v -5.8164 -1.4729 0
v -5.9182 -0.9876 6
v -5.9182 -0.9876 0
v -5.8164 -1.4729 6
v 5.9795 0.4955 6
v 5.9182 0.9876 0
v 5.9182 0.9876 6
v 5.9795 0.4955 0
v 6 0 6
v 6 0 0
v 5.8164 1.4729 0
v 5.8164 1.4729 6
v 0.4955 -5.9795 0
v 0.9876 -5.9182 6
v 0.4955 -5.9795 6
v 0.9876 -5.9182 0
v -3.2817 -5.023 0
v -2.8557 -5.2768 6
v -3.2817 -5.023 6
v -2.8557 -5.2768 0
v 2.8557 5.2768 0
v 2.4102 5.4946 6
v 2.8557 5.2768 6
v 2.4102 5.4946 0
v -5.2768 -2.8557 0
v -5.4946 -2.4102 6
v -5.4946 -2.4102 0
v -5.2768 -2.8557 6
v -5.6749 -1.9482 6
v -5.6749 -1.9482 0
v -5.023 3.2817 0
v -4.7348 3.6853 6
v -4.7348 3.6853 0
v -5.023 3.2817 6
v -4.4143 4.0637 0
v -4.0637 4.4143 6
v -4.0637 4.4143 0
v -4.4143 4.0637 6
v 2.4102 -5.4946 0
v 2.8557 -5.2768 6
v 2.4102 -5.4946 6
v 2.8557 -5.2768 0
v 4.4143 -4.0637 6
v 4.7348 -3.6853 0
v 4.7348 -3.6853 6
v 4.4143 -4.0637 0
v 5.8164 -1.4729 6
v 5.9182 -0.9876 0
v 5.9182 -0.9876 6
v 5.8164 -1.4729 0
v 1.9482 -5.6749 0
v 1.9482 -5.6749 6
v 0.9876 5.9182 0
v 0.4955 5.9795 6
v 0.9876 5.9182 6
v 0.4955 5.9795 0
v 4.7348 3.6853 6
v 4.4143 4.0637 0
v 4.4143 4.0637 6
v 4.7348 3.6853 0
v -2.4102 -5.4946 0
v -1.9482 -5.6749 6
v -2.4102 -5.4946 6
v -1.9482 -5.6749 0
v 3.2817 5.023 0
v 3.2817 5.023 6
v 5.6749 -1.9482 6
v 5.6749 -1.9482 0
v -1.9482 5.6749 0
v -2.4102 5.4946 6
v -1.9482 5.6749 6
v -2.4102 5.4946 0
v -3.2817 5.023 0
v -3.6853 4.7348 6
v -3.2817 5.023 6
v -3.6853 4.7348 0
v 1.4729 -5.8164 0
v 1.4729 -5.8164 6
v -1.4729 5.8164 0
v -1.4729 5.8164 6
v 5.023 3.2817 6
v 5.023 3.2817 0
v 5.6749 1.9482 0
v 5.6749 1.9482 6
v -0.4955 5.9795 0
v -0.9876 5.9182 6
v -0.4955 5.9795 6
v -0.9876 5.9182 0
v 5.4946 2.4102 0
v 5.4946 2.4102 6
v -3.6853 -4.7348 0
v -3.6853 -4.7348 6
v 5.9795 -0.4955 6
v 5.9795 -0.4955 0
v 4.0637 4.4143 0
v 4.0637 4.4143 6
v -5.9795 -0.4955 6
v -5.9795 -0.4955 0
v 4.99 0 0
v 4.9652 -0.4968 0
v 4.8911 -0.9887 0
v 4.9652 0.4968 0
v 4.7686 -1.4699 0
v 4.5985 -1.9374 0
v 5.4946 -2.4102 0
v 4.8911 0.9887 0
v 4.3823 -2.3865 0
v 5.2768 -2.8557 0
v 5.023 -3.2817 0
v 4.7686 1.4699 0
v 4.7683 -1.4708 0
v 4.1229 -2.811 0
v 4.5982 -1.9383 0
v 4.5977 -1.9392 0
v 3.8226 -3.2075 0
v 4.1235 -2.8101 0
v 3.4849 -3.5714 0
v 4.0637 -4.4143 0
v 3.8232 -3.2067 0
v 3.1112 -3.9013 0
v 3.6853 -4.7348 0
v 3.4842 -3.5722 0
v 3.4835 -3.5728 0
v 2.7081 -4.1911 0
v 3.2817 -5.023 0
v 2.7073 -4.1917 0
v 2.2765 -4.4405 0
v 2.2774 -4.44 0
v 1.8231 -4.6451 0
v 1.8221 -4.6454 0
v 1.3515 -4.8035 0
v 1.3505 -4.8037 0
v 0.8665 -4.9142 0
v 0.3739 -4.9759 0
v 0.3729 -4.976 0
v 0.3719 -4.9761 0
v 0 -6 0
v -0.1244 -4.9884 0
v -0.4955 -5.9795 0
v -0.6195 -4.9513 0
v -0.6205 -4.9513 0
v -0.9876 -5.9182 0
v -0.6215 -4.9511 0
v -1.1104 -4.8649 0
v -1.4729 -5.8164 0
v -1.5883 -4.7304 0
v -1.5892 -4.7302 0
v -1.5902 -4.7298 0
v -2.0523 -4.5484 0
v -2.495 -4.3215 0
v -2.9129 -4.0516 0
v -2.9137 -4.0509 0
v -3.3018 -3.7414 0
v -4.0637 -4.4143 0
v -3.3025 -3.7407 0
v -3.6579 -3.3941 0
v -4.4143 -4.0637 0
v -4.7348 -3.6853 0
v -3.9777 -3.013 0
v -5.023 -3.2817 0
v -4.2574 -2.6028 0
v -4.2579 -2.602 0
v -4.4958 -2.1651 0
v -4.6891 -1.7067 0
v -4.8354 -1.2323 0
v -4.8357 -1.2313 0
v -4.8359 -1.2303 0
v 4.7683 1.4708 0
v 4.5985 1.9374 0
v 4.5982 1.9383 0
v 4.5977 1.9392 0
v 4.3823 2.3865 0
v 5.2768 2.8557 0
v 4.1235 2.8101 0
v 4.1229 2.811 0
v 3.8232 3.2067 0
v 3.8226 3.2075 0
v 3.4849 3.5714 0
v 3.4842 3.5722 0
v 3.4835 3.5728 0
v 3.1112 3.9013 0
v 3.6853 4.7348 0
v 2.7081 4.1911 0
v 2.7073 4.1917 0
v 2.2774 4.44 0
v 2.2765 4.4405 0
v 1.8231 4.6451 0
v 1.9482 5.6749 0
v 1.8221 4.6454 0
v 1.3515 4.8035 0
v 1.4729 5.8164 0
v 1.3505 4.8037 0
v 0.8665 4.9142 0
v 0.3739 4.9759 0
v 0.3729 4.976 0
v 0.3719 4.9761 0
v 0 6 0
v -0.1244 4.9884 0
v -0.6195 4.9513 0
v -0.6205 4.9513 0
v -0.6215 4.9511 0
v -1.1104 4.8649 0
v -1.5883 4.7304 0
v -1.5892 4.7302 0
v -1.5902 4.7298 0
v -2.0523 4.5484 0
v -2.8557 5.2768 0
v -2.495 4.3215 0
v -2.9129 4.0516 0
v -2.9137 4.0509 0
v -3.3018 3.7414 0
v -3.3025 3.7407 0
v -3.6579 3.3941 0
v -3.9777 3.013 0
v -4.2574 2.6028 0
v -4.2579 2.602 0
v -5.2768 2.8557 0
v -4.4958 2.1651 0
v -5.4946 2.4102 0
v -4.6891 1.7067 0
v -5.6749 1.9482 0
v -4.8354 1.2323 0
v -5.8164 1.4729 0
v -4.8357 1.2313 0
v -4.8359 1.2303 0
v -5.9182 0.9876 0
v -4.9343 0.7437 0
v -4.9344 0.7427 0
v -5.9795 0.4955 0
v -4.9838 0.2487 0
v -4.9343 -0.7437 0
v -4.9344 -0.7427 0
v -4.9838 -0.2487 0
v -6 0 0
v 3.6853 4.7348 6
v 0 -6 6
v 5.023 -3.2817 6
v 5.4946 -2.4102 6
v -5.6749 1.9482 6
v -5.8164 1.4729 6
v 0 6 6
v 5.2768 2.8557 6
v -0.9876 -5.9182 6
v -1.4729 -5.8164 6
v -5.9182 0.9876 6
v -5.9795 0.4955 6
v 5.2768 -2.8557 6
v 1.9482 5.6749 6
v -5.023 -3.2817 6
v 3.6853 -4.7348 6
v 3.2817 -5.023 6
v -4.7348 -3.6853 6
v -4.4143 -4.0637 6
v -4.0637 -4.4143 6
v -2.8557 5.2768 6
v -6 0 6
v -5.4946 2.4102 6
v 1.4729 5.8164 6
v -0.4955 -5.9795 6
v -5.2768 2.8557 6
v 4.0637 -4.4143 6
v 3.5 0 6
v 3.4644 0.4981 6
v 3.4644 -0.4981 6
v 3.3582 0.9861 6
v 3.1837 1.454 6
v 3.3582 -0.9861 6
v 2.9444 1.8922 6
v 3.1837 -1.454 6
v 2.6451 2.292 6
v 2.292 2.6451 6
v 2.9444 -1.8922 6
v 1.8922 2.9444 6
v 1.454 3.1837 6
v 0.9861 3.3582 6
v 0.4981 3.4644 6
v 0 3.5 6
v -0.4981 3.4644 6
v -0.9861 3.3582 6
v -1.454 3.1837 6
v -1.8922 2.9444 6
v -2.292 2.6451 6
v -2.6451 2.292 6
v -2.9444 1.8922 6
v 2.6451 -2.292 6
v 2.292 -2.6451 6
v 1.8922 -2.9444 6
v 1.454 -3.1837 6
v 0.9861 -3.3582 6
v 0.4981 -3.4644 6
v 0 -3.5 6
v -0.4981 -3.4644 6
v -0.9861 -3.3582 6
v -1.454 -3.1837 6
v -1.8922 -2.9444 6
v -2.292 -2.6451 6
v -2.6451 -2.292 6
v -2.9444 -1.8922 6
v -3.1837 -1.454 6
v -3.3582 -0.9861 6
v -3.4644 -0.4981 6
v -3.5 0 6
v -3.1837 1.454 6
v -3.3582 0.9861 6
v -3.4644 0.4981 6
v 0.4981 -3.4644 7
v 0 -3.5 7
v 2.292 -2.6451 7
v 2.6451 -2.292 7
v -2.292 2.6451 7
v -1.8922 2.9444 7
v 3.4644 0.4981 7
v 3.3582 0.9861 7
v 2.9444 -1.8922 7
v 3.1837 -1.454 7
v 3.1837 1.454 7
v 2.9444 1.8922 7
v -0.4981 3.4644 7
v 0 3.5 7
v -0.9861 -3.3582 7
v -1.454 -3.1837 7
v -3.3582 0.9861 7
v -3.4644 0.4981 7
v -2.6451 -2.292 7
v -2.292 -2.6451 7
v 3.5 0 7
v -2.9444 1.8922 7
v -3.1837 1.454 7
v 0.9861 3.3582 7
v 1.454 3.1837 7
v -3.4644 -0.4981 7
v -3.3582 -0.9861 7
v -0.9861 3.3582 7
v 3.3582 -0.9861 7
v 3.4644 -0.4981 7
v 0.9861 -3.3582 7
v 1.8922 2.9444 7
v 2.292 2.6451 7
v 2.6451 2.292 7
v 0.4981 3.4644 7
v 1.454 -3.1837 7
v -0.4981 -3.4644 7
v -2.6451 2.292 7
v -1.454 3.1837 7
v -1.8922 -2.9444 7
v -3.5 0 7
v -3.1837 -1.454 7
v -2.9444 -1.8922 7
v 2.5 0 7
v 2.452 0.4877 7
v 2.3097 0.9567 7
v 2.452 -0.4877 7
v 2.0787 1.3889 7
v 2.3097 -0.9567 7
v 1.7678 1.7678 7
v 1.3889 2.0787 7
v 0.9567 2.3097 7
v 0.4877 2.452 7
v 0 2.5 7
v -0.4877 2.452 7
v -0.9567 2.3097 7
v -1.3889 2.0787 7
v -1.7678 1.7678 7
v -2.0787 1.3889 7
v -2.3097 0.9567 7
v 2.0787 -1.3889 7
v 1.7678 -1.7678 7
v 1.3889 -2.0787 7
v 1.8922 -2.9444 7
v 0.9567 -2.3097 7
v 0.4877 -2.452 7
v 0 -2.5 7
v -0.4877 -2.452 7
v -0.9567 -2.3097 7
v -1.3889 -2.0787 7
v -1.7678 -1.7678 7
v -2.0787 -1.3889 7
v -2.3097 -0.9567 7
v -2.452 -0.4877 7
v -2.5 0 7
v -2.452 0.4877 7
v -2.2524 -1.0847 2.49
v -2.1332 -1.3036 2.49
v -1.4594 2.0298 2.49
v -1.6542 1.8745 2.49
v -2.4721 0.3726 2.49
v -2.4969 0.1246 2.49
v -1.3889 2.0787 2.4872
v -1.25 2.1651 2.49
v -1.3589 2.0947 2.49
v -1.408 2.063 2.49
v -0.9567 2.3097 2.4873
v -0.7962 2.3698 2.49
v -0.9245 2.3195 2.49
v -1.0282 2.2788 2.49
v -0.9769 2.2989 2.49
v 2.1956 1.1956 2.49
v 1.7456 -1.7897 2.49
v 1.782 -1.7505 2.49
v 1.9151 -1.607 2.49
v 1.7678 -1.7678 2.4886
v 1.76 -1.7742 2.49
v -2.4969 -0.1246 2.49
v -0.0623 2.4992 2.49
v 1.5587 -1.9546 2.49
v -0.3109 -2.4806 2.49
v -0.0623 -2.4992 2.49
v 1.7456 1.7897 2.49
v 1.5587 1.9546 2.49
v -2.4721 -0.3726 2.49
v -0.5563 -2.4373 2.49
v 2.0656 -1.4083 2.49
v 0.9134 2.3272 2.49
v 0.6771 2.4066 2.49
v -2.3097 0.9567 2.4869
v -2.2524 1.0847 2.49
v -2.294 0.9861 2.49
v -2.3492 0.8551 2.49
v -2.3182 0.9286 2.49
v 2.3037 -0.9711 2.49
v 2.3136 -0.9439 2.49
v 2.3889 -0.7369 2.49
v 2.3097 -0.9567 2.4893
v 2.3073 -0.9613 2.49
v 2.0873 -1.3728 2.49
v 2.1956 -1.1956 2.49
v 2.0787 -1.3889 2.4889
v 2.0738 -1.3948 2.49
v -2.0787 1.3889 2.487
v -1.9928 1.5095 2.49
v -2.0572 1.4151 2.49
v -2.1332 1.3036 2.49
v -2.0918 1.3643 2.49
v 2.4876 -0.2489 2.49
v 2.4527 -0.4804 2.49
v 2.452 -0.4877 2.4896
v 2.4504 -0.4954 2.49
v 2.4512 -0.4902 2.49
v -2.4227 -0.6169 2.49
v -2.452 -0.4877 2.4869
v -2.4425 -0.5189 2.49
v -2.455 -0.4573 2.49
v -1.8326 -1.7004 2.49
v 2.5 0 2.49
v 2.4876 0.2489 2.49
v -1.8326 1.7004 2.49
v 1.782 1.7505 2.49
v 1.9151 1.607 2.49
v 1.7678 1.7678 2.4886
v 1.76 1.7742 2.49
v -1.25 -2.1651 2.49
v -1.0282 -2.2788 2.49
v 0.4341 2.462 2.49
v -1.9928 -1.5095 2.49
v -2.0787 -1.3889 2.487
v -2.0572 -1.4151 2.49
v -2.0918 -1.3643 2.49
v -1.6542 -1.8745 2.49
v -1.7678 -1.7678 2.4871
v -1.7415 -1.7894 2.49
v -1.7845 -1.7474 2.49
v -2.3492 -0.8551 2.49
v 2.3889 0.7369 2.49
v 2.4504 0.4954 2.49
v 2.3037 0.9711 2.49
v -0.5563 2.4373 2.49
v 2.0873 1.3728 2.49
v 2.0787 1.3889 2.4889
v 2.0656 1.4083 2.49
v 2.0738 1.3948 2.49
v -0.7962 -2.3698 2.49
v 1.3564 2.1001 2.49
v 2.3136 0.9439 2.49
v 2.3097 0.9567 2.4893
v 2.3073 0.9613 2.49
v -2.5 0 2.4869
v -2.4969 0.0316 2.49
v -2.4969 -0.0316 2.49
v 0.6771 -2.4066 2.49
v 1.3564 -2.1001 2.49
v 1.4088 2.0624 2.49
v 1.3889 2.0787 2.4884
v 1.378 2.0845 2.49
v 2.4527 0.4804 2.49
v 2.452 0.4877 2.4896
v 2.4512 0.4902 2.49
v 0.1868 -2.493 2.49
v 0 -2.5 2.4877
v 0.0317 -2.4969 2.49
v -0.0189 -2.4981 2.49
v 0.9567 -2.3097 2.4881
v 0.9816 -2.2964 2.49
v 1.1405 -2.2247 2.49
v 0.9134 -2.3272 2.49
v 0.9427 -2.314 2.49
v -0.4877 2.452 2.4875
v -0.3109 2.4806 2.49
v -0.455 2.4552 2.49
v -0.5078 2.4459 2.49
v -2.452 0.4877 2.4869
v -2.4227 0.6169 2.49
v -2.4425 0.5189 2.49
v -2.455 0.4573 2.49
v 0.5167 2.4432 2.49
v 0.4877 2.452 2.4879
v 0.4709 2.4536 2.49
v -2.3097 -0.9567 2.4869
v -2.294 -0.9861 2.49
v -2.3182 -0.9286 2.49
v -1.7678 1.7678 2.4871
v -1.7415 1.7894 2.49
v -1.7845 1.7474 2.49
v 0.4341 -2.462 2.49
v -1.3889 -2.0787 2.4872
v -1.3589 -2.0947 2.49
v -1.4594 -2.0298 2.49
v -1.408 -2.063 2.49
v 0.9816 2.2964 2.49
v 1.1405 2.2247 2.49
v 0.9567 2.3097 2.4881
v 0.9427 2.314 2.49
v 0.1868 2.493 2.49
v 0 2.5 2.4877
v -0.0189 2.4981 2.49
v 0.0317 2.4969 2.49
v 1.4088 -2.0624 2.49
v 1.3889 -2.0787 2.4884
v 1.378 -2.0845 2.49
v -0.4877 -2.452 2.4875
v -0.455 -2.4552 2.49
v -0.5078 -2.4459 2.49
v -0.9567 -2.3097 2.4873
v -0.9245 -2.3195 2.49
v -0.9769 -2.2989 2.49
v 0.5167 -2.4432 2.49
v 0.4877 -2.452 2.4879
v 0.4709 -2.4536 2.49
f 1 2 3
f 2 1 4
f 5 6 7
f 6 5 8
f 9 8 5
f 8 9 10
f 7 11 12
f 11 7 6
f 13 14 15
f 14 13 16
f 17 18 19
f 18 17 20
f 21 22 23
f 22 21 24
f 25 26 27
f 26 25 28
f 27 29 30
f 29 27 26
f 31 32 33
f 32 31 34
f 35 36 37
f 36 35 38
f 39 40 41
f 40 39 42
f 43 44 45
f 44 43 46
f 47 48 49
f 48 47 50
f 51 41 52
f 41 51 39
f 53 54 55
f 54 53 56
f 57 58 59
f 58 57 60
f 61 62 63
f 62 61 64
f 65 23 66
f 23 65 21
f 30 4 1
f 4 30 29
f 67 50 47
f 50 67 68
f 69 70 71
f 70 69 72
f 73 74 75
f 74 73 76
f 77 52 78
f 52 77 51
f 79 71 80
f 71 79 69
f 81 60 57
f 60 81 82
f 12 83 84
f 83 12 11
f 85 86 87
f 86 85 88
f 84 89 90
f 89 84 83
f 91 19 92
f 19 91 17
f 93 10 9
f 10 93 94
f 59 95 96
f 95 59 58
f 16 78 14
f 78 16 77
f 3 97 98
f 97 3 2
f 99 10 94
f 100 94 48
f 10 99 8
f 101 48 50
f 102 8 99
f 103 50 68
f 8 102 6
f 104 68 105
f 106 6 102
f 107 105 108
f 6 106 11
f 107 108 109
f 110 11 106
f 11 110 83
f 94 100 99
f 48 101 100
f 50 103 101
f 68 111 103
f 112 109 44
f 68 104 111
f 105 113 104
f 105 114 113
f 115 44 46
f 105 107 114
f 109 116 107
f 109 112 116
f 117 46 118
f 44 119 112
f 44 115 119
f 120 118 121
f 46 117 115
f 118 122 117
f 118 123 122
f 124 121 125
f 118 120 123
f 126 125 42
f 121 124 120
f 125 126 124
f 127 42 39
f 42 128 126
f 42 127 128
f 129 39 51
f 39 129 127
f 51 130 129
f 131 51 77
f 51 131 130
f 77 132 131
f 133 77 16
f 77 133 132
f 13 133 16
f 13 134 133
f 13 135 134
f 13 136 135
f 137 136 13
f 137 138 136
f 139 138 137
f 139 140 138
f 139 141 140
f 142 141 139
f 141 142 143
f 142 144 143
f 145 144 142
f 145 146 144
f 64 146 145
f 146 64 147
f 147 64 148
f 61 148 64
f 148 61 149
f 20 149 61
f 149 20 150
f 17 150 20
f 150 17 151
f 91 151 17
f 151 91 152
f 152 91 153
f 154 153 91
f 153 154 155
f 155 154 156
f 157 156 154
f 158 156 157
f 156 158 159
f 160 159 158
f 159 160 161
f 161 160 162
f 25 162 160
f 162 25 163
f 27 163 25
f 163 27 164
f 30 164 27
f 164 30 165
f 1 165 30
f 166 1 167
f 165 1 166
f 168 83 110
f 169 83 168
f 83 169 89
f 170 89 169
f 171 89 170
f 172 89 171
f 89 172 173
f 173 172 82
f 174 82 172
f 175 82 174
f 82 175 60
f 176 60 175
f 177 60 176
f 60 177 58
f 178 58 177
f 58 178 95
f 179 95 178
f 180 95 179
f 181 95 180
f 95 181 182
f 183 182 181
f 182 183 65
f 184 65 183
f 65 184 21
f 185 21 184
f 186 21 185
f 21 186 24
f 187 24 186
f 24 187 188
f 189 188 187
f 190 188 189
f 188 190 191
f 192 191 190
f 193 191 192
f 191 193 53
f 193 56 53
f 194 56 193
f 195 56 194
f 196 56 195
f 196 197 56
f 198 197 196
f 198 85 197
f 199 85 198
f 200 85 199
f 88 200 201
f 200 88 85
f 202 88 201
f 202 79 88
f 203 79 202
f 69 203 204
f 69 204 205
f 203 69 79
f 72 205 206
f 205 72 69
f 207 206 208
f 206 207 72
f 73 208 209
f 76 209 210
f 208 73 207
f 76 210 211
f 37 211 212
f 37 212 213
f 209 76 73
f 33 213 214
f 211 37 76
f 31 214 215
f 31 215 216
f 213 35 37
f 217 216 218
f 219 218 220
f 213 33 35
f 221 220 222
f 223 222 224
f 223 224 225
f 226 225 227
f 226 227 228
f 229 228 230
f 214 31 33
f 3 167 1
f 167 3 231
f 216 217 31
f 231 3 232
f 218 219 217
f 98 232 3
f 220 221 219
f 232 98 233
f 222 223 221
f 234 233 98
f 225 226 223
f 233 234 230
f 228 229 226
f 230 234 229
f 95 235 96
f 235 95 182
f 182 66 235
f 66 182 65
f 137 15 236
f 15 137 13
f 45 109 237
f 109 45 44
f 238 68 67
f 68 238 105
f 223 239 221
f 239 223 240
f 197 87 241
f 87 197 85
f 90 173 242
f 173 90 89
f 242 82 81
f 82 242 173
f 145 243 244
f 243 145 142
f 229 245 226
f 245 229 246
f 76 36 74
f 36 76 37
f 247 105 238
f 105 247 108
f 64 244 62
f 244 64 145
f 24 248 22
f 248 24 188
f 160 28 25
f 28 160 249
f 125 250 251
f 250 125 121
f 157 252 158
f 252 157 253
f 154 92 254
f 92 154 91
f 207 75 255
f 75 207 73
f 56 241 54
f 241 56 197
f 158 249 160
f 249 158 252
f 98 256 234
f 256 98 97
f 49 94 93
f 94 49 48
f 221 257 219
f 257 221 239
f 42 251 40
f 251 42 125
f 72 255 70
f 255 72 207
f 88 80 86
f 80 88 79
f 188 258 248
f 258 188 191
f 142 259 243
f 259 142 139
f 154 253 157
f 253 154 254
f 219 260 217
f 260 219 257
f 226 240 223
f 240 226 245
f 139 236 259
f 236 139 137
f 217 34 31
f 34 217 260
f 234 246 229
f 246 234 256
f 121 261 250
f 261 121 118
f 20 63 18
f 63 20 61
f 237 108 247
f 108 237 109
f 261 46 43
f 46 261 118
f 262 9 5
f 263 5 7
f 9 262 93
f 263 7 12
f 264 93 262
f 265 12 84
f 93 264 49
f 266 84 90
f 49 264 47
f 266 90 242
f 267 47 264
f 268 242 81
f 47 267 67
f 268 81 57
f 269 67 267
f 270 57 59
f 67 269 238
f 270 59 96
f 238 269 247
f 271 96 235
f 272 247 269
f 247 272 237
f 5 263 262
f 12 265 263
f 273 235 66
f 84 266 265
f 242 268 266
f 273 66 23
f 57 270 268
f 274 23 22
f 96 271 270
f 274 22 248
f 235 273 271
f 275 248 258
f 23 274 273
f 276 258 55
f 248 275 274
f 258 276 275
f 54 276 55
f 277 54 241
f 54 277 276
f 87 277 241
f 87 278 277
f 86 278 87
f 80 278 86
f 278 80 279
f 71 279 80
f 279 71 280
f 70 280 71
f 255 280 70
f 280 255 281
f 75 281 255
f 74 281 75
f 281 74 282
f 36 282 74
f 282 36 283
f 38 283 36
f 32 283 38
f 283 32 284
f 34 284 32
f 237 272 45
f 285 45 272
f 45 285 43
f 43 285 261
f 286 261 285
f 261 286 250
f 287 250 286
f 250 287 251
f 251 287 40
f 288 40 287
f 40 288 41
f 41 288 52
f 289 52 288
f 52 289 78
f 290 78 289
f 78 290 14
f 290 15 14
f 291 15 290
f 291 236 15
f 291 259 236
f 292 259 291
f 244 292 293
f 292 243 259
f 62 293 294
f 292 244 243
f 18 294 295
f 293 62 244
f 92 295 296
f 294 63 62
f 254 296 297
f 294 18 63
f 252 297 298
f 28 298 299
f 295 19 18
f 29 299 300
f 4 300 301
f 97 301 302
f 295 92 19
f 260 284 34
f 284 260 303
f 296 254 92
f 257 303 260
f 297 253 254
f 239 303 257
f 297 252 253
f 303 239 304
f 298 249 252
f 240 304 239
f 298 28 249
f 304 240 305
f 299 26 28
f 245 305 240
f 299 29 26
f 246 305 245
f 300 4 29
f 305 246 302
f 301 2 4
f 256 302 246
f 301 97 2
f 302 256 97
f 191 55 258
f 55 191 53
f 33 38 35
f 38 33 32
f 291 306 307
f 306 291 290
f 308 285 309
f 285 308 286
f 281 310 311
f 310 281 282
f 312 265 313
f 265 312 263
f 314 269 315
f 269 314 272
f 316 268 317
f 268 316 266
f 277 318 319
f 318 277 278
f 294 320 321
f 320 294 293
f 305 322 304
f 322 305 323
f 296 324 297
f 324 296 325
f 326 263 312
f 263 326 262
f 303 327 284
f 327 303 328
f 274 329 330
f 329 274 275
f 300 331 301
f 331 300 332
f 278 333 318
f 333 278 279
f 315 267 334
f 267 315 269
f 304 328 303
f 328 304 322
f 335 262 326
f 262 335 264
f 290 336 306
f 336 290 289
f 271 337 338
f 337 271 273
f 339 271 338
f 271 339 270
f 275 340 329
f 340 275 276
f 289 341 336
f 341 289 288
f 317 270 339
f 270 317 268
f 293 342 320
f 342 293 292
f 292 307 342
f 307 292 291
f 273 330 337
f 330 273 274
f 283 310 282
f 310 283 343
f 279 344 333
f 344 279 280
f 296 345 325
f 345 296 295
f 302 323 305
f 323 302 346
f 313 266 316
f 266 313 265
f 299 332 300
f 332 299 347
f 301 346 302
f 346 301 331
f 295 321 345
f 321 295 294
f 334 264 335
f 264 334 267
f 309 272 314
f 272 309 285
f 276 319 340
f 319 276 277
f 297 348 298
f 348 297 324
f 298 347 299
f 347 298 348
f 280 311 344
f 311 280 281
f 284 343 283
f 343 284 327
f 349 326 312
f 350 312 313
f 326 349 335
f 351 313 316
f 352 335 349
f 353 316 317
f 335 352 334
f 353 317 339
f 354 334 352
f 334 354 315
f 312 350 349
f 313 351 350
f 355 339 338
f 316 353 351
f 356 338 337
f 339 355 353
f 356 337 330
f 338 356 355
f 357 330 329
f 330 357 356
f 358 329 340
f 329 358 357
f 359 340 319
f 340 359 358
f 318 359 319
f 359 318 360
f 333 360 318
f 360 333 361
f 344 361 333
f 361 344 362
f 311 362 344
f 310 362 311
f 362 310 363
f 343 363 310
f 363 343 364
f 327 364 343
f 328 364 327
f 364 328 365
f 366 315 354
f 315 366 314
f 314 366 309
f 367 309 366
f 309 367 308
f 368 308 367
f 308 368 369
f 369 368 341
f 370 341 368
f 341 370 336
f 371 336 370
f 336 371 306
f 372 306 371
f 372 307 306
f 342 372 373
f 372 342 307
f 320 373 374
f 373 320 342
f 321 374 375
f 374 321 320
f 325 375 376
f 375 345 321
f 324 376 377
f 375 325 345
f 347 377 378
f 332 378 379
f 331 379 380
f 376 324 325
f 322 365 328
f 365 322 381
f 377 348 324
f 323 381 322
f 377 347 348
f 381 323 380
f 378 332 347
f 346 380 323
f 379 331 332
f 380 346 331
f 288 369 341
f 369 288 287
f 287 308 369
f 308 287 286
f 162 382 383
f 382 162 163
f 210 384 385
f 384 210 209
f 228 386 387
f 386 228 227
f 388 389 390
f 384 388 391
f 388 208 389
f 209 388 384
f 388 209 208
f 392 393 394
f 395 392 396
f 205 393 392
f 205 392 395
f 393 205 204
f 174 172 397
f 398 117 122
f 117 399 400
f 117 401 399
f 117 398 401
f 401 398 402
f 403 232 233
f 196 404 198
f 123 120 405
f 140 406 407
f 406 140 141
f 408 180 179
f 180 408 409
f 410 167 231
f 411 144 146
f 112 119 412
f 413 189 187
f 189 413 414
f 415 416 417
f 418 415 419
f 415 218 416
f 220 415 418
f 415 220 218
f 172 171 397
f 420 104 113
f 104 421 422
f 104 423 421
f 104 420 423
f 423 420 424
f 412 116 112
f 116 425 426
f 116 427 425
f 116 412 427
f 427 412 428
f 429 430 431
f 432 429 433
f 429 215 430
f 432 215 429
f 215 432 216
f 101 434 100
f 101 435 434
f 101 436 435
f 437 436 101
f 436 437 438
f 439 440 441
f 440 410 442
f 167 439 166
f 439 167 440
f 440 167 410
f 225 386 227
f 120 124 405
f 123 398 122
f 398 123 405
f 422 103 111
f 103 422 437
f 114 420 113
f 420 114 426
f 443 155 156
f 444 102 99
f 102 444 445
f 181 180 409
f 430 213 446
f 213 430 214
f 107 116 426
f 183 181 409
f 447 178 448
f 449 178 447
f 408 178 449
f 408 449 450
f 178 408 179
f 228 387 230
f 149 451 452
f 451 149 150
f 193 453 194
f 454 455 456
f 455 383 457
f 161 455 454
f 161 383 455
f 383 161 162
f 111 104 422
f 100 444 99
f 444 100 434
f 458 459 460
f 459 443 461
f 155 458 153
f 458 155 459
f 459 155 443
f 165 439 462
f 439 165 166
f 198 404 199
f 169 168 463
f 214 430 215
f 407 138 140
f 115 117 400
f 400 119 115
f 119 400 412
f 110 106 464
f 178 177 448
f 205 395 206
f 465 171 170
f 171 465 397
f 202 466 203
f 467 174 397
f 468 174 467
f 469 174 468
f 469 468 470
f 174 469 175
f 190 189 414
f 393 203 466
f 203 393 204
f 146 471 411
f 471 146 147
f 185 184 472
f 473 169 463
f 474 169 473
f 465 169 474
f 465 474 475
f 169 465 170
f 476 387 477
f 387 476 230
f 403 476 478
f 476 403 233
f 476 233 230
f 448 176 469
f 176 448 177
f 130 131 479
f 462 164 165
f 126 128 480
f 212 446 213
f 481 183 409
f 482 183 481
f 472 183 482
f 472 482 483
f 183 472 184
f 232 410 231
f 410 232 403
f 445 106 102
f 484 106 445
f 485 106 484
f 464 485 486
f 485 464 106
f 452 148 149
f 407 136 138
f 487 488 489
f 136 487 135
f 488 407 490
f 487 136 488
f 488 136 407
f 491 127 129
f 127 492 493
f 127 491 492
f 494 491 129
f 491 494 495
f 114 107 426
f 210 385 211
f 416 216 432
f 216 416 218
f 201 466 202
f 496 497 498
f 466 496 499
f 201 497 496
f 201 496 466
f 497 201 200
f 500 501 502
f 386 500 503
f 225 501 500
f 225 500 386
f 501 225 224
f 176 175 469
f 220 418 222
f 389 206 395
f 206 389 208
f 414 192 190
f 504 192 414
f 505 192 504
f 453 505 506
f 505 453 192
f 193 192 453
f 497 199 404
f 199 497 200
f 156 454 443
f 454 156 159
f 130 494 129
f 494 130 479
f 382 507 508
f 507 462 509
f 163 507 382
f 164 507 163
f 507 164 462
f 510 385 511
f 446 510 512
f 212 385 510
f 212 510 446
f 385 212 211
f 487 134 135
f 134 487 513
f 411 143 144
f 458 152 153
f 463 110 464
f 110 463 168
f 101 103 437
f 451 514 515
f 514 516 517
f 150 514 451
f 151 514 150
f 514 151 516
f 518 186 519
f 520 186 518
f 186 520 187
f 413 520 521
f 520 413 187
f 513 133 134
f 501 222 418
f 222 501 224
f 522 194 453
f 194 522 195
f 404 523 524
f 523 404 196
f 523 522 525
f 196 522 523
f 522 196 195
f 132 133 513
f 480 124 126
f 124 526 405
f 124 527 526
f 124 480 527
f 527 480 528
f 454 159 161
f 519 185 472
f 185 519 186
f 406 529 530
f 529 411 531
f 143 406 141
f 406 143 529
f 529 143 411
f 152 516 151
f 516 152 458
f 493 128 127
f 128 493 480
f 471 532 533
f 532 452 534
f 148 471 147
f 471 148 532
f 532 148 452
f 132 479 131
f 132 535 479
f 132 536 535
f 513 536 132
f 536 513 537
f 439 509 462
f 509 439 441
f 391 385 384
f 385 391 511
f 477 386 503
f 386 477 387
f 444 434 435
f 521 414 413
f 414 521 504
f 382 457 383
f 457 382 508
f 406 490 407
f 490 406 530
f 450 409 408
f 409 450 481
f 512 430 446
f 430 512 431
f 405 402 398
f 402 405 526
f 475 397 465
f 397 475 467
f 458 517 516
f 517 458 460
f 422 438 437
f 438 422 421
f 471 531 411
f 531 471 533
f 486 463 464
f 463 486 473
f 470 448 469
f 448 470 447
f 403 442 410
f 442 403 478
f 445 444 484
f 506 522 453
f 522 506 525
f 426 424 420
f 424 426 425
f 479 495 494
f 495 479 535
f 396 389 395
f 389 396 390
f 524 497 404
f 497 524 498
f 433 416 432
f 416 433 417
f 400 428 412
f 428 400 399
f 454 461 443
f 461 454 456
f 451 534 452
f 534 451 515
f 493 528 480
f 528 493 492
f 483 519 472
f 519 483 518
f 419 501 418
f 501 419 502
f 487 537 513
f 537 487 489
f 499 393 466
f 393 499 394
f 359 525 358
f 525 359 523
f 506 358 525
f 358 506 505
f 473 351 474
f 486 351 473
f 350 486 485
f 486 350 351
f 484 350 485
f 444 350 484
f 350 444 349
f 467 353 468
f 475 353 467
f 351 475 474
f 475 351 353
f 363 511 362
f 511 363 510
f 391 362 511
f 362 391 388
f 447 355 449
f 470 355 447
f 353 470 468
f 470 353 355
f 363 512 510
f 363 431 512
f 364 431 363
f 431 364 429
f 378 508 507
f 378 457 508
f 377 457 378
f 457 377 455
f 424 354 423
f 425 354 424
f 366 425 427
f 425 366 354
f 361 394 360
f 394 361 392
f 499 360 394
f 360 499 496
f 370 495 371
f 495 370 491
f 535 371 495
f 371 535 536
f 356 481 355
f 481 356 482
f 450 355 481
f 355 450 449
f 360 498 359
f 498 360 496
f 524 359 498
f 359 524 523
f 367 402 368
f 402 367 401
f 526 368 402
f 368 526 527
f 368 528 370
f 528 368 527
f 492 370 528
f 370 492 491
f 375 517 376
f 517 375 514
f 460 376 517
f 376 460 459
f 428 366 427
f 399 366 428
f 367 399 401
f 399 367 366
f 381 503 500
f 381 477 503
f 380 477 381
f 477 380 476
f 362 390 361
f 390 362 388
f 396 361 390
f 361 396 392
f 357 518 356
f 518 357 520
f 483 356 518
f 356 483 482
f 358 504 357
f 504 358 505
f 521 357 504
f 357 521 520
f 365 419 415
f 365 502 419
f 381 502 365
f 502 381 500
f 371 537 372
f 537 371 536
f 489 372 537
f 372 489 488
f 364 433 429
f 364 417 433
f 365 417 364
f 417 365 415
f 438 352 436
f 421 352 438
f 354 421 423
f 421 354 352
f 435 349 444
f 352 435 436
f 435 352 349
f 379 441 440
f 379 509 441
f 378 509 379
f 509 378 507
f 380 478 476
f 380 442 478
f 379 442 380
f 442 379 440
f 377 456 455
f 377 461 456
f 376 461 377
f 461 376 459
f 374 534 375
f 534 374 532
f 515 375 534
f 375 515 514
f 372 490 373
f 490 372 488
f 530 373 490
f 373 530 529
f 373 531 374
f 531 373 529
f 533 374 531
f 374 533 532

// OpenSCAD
// Used for making shelves out of OSB and metal angles
$fa=1/1;
$fs=1/2;
bissl=1/100;
thickness=1;
hole=7;
height=7;
head=10;
id=5;
od=12;
difference() {
  union() {
    cylinder(h=height-thickness,d=od);
    cylinder(h=height,d=hole);
  }
  translate([0,0,-bissl])cylinder(d1=head,d2=id,h=(head-id)/2);
  cylinder(d=id,h=height+bissl);
}
